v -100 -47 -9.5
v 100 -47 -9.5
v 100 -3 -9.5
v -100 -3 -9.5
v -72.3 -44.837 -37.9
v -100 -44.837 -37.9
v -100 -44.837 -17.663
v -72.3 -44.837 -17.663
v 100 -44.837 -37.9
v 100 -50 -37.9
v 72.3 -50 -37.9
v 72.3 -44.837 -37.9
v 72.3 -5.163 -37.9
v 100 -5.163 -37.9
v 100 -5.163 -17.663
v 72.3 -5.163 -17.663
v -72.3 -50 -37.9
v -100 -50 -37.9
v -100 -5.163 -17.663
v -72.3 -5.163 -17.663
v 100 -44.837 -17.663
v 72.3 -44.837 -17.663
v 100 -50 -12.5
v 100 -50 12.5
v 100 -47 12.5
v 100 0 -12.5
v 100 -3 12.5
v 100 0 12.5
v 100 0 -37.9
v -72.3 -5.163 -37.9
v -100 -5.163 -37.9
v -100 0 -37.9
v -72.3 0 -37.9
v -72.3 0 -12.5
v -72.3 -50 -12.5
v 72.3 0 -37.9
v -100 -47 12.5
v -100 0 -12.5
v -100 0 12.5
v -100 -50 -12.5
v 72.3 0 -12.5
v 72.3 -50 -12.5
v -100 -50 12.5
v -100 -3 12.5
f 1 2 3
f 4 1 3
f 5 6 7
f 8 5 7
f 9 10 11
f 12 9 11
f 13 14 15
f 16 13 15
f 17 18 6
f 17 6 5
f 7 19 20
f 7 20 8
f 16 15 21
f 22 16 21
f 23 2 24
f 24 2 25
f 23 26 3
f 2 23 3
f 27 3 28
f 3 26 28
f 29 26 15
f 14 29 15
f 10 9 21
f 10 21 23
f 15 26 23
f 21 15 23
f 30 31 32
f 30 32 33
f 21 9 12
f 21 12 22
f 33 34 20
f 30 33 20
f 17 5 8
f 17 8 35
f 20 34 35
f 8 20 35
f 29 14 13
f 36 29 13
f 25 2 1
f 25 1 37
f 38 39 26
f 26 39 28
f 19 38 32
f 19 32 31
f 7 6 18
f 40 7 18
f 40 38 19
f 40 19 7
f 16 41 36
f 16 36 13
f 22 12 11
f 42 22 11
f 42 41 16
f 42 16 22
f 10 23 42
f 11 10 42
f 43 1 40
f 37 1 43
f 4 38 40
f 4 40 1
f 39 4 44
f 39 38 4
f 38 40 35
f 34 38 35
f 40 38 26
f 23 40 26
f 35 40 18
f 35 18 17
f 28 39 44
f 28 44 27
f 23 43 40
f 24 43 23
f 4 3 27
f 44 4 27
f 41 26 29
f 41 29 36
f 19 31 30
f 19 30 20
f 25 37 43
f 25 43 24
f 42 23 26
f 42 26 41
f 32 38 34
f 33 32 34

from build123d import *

# Parameters (mm, degrees)
F0_W     = 200
F0_H     = 25
F1_DEPTH = 50
F2_W     = 44
F2_H     = 22
F3_DEPTH = 200.001
F4_W     = 27.7002811432
F4_H     = 50
F5_DEPTH = 25.4
F6_W     = 39.6731255576
F6_H     = 20.2365627788
F7_DEPTH = 200.001


with BuildPart() as f1:
    # F0 (on Front) → F1 (new body)
    with BuildSketch(Plane.XZ):
        Rectangle(F0_W, F0_H)
    extrude(amount=F1_DEPTH)

    # F2 (on face) → F3 (cut, through all)
    with BuildSketch(Plane.YZ.offset(100)):
        with Locations((-25, 1.5)):
            Rectangle(F2_W, F2_H)
    extrude(amount=-F3_DEPTH, mode=Mode.SUBTRACT)


with BuildPart() as f5:
    # F4 (on face) → F5 (new body)
    with BuildSketch(Plane(origin=(0, 0, -12.5), x_dir=(1, 0, 0), z_dir=(0, 0, -1))):
        with Locations((-86.1498594284, 25)):
            Rectangle(F4_W, F4_H)
    extrude(amount=F5_DEPTH)

    # F6 (on face) → F7 (cut, through all)
    with BuildSketch(Plane(origin=(-100, 0, 0), x_dir=(0, -1, 0), z_dir=(-1, 0, 0))):
        with Locations((25, -27.7817186106)):
            Rectangle(F6_W, F6_H)
    extrude(amount=-F7_DEPTH, mode=Mode.SUBTRACT)


with BuildPart() as f8_1:
    # F8: instance of F5
    add(f5.part.mirror(Plane.YZ))


solid = Compound([f1.part, f5.part, f8_1.part])
